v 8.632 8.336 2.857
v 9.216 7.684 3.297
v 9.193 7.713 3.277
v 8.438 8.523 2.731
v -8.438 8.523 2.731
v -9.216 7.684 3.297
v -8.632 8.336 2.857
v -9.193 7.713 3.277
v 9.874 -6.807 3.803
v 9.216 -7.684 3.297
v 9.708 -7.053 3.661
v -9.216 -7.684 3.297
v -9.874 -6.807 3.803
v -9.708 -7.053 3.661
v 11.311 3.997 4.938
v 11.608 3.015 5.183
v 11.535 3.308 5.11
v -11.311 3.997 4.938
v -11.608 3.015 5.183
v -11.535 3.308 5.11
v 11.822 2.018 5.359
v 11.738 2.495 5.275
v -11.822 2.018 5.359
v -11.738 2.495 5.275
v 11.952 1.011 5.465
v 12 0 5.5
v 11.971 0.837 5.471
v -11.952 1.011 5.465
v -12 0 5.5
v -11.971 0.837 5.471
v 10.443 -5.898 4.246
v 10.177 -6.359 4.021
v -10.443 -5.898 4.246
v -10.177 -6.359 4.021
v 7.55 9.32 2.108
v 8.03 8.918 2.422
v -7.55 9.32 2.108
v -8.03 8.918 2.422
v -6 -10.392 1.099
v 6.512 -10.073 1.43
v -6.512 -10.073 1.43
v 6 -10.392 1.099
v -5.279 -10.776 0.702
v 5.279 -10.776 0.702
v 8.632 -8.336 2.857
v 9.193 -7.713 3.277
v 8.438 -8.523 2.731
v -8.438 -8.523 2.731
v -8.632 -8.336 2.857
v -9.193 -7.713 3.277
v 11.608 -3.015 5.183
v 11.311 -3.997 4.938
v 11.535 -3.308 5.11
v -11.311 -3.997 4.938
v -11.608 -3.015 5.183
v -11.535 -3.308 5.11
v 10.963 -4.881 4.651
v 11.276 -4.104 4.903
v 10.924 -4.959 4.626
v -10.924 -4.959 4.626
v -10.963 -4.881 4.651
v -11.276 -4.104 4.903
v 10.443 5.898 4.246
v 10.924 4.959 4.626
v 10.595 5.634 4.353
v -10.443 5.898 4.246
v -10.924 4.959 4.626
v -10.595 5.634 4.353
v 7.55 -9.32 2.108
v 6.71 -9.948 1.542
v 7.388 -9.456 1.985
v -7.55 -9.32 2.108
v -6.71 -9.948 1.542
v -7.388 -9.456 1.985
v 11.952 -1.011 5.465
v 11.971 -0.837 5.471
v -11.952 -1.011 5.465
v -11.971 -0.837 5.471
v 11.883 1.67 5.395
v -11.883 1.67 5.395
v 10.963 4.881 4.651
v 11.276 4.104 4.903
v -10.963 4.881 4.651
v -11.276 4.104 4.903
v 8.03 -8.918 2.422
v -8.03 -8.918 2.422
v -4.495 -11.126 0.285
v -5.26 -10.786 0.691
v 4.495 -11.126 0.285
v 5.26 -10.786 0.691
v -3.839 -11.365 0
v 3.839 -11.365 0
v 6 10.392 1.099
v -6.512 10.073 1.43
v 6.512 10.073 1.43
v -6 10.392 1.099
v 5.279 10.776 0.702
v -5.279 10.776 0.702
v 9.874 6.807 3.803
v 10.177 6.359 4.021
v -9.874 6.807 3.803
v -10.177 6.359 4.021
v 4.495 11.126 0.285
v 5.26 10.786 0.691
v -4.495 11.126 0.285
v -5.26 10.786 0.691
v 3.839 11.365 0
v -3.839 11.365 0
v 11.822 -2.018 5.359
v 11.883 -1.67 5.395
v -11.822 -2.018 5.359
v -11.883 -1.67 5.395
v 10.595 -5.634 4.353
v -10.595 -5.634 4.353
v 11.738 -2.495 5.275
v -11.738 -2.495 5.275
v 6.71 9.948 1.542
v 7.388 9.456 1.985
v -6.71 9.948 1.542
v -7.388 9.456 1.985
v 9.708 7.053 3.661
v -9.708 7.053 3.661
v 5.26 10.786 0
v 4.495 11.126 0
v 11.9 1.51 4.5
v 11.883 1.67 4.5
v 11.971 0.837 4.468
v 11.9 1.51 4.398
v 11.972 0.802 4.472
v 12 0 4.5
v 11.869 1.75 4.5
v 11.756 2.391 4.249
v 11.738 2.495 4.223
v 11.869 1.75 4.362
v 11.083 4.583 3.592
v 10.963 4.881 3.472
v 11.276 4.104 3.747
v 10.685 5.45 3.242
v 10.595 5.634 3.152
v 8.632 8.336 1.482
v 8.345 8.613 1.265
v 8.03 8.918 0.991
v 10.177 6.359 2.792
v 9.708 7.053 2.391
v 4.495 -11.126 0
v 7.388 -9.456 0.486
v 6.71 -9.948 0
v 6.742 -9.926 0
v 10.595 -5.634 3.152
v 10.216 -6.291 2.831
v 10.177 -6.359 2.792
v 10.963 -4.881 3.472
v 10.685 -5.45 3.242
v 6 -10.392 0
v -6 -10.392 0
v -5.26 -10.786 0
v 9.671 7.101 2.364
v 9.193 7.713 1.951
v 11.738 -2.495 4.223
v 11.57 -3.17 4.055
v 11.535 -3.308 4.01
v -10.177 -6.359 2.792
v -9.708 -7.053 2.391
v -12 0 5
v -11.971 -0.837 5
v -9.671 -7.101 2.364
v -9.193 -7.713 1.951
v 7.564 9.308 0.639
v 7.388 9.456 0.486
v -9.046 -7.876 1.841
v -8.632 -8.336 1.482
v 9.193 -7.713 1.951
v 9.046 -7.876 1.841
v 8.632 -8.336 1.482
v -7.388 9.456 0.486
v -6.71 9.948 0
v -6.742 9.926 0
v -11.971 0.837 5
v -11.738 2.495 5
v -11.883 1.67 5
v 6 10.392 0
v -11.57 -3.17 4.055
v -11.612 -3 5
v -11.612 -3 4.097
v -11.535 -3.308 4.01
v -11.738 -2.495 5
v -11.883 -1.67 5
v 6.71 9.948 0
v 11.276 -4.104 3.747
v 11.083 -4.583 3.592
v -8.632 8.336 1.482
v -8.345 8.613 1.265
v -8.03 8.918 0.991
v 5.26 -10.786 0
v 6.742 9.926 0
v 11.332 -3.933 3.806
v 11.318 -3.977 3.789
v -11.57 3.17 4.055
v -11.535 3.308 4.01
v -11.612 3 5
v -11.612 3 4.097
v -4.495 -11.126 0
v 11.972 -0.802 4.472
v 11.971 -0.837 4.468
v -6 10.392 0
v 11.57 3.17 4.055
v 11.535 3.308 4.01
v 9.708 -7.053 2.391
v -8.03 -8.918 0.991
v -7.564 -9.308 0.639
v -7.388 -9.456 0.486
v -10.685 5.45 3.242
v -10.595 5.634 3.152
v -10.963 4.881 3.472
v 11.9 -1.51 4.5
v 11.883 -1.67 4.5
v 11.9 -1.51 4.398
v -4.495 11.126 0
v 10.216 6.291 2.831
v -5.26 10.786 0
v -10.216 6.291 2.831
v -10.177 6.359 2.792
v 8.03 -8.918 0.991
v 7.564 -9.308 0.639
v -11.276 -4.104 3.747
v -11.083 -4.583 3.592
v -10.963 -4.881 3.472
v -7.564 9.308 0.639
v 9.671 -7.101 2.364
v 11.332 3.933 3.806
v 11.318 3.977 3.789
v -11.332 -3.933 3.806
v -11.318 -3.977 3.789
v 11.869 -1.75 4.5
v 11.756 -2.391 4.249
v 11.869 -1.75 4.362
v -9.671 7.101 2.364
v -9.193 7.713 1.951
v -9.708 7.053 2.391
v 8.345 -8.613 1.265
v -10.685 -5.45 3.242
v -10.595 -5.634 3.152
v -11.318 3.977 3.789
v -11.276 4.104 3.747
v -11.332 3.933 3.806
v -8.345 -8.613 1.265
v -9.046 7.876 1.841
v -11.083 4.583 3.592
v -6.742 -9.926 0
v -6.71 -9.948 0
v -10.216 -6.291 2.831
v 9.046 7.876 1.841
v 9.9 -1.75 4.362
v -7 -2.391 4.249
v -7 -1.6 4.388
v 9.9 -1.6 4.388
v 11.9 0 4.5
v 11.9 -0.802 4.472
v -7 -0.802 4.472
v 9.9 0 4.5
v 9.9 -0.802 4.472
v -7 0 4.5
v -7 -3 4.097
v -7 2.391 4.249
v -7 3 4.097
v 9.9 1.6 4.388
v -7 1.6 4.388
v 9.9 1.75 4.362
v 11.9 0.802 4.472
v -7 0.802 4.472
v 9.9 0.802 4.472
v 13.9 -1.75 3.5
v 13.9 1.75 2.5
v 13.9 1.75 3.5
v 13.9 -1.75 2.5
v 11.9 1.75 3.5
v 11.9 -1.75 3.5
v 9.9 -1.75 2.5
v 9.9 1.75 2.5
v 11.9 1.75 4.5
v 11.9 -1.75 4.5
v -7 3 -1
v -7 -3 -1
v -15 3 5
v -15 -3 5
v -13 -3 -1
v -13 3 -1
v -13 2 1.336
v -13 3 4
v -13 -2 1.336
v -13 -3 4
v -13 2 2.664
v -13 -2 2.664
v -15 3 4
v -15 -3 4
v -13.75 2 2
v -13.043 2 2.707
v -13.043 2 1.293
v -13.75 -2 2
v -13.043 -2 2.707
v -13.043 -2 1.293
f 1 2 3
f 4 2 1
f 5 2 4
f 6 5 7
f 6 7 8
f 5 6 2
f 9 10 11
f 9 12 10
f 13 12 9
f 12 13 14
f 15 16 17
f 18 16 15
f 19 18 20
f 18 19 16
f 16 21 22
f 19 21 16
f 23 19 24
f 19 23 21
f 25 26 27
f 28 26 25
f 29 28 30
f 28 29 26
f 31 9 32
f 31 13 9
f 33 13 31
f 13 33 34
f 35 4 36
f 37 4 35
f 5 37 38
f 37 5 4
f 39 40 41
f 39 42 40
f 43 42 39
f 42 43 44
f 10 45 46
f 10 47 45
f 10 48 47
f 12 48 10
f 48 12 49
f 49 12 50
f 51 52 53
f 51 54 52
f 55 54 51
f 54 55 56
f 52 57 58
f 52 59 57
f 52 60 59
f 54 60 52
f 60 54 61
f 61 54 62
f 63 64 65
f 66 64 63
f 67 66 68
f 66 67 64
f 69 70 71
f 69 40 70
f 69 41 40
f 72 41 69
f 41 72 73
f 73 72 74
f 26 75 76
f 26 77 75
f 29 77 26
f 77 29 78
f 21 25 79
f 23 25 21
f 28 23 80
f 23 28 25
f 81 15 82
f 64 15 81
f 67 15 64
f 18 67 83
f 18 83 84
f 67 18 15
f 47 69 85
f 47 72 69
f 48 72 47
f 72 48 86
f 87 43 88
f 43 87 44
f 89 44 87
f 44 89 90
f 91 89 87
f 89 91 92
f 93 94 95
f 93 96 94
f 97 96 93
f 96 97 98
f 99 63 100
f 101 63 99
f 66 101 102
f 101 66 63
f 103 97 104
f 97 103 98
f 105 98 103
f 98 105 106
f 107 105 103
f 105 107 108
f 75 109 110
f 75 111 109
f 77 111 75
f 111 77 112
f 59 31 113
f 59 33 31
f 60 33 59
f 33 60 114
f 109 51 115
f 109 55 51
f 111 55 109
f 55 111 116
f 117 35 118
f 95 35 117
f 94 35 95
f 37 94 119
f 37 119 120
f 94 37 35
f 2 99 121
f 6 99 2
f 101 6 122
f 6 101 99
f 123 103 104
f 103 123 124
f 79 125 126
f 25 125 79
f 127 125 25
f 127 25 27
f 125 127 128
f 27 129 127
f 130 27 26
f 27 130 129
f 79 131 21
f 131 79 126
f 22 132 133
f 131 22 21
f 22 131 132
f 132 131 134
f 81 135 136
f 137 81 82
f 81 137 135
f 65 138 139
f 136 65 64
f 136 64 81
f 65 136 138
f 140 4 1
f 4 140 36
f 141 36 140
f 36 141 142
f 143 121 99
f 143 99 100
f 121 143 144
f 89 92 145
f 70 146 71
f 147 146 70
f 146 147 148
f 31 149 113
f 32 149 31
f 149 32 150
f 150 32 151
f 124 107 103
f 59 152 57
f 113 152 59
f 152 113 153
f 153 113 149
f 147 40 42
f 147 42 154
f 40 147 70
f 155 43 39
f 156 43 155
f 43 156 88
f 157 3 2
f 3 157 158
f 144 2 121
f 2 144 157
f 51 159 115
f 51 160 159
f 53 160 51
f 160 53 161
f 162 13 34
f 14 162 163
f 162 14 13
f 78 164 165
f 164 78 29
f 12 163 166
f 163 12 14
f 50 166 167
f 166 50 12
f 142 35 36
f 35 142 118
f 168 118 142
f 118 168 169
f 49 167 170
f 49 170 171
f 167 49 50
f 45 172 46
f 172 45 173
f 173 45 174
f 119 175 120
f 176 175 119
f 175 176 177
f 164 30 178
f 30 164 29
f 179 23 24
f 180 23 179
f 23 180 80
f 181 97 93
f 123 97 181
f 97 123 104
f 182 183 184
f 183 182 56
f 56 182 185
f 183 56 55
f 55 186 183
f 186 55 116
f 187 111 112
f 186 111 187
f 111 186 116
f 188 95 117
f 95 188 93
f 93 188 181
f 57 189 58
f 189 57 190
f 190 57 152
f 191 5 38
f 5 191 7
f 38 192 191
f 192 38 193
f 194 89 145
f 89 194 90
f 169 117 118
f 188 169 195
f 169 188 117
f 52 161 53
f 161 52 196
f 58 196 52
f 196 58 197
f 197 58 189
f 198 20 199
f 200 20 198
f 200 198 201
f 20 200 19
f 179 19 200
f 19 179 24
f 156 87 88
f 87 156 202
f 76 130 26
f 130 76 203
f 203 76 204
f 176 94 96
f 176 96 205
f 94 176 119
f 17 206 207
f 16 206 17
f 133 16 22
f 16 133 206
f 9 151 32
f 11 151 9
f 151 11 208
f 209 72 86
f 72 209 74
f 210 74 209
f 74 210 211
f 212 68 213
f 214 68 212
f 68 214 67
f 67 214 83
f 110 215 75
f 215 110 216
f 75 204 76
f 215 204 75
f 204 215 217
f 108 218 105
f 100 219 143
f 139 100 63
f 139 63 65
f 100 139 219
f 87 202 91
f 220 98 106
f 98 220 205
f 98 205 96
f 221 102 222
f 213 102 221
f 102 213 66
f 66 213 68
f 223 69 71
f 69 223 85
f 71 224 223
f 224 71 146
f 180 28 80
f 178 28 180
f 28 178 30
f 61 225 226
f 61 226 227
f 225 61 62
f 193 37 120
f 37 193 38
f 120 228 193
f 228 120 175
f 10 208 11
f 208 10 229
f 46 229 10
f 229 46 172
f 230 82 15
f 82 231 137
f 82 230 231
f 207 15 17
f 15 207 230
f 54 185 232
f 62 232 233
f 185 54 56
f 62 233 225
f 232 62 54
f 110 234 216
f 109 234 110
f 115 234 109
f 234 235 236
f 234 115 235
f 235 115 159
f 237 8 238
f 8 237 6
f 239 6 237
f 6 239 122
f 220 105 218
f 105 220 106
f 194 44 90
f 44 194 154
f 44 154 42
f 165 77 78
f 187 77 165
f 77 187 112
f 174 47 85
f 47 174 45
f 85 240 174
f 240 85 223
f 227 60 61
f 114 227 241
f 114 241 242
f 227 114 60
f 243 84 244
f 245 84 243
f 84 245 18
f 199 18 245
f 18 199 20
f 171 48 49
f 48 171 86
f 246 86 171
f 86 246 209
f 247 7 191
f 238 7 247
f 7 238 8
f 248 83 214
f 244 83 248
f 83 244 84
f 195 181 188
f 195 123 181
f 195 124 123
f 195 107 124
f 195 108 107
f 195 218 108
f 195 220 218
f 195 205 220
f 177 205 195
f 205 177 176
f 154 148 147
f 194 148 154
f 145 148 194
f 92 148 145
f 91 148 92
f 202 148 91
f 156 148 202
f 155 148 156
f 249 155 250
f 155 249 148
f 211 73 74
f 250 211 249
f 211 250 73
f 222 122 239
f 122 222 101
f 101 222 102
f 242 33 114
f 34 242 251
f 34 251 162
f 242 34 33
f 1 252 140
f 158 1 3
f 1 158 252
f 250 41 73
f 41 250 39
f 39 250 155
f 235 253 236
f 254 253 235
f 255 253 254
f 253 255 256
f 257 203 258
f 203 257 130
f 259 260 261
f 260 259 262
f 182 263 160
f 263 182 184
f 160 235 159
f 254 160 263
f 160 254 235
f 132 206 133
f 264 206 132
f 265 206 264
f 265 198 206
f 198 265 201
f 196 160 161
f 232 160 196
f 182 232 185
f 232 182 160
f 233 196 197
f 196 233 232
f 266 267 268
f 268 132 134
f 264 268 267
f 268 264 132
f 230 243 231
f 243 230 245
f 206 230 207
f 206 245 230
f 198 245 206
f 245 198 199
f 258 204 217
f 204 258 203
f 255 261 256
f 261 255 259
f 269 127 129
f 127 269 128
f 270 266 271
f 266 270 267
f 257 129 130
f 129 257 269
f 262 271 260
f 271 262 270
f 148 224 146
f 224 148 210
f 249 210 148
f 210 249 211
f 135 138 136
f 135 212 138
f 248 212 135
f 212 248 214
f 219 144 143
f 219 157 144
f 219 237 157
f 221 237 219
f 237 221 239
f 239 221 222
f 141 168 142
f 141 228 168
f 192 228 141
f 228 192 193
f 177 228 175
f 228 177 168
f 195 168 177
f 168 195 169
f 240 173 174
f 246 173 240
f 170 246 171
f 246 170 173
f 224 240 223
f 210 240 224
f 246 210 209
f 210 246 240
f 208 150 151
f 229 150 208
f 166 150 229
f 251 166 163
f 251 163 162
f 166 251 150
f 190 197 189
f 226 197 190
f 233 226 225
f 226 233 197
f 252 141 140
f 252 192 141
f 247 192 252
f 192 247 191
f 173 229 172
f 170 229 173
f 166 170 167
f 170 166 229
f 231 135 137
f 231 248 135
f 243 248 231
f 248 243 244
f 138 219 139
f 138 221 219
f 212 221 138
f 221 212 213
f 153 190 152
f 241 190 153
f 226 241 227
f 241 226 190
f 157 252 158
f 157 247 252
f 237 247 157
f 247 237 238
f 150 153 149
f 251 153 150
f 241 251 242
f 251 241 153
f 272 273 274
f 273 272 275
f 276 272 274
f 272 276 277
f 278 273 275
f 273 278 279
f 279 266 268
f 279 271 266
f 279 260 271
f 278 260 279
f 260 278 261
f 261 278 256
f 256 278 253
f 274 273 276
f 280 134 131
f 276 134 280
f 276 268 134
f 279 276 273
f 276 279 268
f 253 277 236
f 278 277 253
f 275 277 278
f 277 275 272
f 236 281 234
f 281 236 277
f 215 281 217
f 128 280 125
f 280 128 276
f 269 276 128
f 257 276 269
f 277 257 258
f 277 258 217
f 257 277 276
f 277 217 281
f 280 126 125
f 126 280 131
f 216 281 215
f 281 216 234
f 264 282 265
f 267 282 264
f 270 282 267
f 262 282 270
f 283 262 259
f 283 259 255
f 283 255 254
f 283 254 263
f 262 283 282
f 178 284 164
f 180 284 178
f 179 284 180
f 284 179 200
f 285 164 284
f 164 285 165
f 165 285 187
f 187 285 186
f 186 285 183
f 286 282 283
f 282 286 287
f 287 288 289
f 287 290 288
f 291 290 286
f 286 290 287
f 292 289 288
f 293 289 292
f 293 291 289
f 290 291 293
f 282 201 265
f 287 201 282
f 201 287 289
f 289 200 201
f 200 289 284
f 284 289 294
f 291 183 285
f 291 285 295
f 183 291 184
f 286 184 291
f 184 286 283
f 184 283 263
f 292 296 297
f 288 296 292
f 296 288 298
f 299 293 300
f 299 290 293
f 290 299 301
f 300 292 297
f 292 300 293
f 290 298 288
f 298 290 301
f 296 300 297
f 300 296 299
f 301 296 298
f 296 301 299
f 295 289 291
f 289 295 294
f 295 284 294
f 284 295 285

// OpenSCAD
$fn = 90;

difference() {
    intersection() {
        translate([-25, 0, -9]) rotate([0, 90, 0]) cylinder(d = 29, h = 50);
        cylinder(d = 24, h = 6);
    }
    translate([-25, 0, -7]) rotate([0, 90, 0]) cylinder(d = 23, h = 50);
    translate([-25, 0, -9]) rotate([0, 90, 0]) cylinder(d = 26.8, h = 50);
}

translate([9.9, -1.75, 2.5]) {
    cube([4, 3.5, 1]);
    translate([0, 0, 1]) cube([2, 3.5, 1]);
}

translate([-13, -3, -1]) {
    cube([6, 6, 6]);
    
    translate([-0.75, 1, 3]) {
        rotate([0, 45, 0]) cube([1, 4, 1]);
    }
    
    translate([-2, 0, 5]) {
        cube([4, 6, 1]);
    }
}
